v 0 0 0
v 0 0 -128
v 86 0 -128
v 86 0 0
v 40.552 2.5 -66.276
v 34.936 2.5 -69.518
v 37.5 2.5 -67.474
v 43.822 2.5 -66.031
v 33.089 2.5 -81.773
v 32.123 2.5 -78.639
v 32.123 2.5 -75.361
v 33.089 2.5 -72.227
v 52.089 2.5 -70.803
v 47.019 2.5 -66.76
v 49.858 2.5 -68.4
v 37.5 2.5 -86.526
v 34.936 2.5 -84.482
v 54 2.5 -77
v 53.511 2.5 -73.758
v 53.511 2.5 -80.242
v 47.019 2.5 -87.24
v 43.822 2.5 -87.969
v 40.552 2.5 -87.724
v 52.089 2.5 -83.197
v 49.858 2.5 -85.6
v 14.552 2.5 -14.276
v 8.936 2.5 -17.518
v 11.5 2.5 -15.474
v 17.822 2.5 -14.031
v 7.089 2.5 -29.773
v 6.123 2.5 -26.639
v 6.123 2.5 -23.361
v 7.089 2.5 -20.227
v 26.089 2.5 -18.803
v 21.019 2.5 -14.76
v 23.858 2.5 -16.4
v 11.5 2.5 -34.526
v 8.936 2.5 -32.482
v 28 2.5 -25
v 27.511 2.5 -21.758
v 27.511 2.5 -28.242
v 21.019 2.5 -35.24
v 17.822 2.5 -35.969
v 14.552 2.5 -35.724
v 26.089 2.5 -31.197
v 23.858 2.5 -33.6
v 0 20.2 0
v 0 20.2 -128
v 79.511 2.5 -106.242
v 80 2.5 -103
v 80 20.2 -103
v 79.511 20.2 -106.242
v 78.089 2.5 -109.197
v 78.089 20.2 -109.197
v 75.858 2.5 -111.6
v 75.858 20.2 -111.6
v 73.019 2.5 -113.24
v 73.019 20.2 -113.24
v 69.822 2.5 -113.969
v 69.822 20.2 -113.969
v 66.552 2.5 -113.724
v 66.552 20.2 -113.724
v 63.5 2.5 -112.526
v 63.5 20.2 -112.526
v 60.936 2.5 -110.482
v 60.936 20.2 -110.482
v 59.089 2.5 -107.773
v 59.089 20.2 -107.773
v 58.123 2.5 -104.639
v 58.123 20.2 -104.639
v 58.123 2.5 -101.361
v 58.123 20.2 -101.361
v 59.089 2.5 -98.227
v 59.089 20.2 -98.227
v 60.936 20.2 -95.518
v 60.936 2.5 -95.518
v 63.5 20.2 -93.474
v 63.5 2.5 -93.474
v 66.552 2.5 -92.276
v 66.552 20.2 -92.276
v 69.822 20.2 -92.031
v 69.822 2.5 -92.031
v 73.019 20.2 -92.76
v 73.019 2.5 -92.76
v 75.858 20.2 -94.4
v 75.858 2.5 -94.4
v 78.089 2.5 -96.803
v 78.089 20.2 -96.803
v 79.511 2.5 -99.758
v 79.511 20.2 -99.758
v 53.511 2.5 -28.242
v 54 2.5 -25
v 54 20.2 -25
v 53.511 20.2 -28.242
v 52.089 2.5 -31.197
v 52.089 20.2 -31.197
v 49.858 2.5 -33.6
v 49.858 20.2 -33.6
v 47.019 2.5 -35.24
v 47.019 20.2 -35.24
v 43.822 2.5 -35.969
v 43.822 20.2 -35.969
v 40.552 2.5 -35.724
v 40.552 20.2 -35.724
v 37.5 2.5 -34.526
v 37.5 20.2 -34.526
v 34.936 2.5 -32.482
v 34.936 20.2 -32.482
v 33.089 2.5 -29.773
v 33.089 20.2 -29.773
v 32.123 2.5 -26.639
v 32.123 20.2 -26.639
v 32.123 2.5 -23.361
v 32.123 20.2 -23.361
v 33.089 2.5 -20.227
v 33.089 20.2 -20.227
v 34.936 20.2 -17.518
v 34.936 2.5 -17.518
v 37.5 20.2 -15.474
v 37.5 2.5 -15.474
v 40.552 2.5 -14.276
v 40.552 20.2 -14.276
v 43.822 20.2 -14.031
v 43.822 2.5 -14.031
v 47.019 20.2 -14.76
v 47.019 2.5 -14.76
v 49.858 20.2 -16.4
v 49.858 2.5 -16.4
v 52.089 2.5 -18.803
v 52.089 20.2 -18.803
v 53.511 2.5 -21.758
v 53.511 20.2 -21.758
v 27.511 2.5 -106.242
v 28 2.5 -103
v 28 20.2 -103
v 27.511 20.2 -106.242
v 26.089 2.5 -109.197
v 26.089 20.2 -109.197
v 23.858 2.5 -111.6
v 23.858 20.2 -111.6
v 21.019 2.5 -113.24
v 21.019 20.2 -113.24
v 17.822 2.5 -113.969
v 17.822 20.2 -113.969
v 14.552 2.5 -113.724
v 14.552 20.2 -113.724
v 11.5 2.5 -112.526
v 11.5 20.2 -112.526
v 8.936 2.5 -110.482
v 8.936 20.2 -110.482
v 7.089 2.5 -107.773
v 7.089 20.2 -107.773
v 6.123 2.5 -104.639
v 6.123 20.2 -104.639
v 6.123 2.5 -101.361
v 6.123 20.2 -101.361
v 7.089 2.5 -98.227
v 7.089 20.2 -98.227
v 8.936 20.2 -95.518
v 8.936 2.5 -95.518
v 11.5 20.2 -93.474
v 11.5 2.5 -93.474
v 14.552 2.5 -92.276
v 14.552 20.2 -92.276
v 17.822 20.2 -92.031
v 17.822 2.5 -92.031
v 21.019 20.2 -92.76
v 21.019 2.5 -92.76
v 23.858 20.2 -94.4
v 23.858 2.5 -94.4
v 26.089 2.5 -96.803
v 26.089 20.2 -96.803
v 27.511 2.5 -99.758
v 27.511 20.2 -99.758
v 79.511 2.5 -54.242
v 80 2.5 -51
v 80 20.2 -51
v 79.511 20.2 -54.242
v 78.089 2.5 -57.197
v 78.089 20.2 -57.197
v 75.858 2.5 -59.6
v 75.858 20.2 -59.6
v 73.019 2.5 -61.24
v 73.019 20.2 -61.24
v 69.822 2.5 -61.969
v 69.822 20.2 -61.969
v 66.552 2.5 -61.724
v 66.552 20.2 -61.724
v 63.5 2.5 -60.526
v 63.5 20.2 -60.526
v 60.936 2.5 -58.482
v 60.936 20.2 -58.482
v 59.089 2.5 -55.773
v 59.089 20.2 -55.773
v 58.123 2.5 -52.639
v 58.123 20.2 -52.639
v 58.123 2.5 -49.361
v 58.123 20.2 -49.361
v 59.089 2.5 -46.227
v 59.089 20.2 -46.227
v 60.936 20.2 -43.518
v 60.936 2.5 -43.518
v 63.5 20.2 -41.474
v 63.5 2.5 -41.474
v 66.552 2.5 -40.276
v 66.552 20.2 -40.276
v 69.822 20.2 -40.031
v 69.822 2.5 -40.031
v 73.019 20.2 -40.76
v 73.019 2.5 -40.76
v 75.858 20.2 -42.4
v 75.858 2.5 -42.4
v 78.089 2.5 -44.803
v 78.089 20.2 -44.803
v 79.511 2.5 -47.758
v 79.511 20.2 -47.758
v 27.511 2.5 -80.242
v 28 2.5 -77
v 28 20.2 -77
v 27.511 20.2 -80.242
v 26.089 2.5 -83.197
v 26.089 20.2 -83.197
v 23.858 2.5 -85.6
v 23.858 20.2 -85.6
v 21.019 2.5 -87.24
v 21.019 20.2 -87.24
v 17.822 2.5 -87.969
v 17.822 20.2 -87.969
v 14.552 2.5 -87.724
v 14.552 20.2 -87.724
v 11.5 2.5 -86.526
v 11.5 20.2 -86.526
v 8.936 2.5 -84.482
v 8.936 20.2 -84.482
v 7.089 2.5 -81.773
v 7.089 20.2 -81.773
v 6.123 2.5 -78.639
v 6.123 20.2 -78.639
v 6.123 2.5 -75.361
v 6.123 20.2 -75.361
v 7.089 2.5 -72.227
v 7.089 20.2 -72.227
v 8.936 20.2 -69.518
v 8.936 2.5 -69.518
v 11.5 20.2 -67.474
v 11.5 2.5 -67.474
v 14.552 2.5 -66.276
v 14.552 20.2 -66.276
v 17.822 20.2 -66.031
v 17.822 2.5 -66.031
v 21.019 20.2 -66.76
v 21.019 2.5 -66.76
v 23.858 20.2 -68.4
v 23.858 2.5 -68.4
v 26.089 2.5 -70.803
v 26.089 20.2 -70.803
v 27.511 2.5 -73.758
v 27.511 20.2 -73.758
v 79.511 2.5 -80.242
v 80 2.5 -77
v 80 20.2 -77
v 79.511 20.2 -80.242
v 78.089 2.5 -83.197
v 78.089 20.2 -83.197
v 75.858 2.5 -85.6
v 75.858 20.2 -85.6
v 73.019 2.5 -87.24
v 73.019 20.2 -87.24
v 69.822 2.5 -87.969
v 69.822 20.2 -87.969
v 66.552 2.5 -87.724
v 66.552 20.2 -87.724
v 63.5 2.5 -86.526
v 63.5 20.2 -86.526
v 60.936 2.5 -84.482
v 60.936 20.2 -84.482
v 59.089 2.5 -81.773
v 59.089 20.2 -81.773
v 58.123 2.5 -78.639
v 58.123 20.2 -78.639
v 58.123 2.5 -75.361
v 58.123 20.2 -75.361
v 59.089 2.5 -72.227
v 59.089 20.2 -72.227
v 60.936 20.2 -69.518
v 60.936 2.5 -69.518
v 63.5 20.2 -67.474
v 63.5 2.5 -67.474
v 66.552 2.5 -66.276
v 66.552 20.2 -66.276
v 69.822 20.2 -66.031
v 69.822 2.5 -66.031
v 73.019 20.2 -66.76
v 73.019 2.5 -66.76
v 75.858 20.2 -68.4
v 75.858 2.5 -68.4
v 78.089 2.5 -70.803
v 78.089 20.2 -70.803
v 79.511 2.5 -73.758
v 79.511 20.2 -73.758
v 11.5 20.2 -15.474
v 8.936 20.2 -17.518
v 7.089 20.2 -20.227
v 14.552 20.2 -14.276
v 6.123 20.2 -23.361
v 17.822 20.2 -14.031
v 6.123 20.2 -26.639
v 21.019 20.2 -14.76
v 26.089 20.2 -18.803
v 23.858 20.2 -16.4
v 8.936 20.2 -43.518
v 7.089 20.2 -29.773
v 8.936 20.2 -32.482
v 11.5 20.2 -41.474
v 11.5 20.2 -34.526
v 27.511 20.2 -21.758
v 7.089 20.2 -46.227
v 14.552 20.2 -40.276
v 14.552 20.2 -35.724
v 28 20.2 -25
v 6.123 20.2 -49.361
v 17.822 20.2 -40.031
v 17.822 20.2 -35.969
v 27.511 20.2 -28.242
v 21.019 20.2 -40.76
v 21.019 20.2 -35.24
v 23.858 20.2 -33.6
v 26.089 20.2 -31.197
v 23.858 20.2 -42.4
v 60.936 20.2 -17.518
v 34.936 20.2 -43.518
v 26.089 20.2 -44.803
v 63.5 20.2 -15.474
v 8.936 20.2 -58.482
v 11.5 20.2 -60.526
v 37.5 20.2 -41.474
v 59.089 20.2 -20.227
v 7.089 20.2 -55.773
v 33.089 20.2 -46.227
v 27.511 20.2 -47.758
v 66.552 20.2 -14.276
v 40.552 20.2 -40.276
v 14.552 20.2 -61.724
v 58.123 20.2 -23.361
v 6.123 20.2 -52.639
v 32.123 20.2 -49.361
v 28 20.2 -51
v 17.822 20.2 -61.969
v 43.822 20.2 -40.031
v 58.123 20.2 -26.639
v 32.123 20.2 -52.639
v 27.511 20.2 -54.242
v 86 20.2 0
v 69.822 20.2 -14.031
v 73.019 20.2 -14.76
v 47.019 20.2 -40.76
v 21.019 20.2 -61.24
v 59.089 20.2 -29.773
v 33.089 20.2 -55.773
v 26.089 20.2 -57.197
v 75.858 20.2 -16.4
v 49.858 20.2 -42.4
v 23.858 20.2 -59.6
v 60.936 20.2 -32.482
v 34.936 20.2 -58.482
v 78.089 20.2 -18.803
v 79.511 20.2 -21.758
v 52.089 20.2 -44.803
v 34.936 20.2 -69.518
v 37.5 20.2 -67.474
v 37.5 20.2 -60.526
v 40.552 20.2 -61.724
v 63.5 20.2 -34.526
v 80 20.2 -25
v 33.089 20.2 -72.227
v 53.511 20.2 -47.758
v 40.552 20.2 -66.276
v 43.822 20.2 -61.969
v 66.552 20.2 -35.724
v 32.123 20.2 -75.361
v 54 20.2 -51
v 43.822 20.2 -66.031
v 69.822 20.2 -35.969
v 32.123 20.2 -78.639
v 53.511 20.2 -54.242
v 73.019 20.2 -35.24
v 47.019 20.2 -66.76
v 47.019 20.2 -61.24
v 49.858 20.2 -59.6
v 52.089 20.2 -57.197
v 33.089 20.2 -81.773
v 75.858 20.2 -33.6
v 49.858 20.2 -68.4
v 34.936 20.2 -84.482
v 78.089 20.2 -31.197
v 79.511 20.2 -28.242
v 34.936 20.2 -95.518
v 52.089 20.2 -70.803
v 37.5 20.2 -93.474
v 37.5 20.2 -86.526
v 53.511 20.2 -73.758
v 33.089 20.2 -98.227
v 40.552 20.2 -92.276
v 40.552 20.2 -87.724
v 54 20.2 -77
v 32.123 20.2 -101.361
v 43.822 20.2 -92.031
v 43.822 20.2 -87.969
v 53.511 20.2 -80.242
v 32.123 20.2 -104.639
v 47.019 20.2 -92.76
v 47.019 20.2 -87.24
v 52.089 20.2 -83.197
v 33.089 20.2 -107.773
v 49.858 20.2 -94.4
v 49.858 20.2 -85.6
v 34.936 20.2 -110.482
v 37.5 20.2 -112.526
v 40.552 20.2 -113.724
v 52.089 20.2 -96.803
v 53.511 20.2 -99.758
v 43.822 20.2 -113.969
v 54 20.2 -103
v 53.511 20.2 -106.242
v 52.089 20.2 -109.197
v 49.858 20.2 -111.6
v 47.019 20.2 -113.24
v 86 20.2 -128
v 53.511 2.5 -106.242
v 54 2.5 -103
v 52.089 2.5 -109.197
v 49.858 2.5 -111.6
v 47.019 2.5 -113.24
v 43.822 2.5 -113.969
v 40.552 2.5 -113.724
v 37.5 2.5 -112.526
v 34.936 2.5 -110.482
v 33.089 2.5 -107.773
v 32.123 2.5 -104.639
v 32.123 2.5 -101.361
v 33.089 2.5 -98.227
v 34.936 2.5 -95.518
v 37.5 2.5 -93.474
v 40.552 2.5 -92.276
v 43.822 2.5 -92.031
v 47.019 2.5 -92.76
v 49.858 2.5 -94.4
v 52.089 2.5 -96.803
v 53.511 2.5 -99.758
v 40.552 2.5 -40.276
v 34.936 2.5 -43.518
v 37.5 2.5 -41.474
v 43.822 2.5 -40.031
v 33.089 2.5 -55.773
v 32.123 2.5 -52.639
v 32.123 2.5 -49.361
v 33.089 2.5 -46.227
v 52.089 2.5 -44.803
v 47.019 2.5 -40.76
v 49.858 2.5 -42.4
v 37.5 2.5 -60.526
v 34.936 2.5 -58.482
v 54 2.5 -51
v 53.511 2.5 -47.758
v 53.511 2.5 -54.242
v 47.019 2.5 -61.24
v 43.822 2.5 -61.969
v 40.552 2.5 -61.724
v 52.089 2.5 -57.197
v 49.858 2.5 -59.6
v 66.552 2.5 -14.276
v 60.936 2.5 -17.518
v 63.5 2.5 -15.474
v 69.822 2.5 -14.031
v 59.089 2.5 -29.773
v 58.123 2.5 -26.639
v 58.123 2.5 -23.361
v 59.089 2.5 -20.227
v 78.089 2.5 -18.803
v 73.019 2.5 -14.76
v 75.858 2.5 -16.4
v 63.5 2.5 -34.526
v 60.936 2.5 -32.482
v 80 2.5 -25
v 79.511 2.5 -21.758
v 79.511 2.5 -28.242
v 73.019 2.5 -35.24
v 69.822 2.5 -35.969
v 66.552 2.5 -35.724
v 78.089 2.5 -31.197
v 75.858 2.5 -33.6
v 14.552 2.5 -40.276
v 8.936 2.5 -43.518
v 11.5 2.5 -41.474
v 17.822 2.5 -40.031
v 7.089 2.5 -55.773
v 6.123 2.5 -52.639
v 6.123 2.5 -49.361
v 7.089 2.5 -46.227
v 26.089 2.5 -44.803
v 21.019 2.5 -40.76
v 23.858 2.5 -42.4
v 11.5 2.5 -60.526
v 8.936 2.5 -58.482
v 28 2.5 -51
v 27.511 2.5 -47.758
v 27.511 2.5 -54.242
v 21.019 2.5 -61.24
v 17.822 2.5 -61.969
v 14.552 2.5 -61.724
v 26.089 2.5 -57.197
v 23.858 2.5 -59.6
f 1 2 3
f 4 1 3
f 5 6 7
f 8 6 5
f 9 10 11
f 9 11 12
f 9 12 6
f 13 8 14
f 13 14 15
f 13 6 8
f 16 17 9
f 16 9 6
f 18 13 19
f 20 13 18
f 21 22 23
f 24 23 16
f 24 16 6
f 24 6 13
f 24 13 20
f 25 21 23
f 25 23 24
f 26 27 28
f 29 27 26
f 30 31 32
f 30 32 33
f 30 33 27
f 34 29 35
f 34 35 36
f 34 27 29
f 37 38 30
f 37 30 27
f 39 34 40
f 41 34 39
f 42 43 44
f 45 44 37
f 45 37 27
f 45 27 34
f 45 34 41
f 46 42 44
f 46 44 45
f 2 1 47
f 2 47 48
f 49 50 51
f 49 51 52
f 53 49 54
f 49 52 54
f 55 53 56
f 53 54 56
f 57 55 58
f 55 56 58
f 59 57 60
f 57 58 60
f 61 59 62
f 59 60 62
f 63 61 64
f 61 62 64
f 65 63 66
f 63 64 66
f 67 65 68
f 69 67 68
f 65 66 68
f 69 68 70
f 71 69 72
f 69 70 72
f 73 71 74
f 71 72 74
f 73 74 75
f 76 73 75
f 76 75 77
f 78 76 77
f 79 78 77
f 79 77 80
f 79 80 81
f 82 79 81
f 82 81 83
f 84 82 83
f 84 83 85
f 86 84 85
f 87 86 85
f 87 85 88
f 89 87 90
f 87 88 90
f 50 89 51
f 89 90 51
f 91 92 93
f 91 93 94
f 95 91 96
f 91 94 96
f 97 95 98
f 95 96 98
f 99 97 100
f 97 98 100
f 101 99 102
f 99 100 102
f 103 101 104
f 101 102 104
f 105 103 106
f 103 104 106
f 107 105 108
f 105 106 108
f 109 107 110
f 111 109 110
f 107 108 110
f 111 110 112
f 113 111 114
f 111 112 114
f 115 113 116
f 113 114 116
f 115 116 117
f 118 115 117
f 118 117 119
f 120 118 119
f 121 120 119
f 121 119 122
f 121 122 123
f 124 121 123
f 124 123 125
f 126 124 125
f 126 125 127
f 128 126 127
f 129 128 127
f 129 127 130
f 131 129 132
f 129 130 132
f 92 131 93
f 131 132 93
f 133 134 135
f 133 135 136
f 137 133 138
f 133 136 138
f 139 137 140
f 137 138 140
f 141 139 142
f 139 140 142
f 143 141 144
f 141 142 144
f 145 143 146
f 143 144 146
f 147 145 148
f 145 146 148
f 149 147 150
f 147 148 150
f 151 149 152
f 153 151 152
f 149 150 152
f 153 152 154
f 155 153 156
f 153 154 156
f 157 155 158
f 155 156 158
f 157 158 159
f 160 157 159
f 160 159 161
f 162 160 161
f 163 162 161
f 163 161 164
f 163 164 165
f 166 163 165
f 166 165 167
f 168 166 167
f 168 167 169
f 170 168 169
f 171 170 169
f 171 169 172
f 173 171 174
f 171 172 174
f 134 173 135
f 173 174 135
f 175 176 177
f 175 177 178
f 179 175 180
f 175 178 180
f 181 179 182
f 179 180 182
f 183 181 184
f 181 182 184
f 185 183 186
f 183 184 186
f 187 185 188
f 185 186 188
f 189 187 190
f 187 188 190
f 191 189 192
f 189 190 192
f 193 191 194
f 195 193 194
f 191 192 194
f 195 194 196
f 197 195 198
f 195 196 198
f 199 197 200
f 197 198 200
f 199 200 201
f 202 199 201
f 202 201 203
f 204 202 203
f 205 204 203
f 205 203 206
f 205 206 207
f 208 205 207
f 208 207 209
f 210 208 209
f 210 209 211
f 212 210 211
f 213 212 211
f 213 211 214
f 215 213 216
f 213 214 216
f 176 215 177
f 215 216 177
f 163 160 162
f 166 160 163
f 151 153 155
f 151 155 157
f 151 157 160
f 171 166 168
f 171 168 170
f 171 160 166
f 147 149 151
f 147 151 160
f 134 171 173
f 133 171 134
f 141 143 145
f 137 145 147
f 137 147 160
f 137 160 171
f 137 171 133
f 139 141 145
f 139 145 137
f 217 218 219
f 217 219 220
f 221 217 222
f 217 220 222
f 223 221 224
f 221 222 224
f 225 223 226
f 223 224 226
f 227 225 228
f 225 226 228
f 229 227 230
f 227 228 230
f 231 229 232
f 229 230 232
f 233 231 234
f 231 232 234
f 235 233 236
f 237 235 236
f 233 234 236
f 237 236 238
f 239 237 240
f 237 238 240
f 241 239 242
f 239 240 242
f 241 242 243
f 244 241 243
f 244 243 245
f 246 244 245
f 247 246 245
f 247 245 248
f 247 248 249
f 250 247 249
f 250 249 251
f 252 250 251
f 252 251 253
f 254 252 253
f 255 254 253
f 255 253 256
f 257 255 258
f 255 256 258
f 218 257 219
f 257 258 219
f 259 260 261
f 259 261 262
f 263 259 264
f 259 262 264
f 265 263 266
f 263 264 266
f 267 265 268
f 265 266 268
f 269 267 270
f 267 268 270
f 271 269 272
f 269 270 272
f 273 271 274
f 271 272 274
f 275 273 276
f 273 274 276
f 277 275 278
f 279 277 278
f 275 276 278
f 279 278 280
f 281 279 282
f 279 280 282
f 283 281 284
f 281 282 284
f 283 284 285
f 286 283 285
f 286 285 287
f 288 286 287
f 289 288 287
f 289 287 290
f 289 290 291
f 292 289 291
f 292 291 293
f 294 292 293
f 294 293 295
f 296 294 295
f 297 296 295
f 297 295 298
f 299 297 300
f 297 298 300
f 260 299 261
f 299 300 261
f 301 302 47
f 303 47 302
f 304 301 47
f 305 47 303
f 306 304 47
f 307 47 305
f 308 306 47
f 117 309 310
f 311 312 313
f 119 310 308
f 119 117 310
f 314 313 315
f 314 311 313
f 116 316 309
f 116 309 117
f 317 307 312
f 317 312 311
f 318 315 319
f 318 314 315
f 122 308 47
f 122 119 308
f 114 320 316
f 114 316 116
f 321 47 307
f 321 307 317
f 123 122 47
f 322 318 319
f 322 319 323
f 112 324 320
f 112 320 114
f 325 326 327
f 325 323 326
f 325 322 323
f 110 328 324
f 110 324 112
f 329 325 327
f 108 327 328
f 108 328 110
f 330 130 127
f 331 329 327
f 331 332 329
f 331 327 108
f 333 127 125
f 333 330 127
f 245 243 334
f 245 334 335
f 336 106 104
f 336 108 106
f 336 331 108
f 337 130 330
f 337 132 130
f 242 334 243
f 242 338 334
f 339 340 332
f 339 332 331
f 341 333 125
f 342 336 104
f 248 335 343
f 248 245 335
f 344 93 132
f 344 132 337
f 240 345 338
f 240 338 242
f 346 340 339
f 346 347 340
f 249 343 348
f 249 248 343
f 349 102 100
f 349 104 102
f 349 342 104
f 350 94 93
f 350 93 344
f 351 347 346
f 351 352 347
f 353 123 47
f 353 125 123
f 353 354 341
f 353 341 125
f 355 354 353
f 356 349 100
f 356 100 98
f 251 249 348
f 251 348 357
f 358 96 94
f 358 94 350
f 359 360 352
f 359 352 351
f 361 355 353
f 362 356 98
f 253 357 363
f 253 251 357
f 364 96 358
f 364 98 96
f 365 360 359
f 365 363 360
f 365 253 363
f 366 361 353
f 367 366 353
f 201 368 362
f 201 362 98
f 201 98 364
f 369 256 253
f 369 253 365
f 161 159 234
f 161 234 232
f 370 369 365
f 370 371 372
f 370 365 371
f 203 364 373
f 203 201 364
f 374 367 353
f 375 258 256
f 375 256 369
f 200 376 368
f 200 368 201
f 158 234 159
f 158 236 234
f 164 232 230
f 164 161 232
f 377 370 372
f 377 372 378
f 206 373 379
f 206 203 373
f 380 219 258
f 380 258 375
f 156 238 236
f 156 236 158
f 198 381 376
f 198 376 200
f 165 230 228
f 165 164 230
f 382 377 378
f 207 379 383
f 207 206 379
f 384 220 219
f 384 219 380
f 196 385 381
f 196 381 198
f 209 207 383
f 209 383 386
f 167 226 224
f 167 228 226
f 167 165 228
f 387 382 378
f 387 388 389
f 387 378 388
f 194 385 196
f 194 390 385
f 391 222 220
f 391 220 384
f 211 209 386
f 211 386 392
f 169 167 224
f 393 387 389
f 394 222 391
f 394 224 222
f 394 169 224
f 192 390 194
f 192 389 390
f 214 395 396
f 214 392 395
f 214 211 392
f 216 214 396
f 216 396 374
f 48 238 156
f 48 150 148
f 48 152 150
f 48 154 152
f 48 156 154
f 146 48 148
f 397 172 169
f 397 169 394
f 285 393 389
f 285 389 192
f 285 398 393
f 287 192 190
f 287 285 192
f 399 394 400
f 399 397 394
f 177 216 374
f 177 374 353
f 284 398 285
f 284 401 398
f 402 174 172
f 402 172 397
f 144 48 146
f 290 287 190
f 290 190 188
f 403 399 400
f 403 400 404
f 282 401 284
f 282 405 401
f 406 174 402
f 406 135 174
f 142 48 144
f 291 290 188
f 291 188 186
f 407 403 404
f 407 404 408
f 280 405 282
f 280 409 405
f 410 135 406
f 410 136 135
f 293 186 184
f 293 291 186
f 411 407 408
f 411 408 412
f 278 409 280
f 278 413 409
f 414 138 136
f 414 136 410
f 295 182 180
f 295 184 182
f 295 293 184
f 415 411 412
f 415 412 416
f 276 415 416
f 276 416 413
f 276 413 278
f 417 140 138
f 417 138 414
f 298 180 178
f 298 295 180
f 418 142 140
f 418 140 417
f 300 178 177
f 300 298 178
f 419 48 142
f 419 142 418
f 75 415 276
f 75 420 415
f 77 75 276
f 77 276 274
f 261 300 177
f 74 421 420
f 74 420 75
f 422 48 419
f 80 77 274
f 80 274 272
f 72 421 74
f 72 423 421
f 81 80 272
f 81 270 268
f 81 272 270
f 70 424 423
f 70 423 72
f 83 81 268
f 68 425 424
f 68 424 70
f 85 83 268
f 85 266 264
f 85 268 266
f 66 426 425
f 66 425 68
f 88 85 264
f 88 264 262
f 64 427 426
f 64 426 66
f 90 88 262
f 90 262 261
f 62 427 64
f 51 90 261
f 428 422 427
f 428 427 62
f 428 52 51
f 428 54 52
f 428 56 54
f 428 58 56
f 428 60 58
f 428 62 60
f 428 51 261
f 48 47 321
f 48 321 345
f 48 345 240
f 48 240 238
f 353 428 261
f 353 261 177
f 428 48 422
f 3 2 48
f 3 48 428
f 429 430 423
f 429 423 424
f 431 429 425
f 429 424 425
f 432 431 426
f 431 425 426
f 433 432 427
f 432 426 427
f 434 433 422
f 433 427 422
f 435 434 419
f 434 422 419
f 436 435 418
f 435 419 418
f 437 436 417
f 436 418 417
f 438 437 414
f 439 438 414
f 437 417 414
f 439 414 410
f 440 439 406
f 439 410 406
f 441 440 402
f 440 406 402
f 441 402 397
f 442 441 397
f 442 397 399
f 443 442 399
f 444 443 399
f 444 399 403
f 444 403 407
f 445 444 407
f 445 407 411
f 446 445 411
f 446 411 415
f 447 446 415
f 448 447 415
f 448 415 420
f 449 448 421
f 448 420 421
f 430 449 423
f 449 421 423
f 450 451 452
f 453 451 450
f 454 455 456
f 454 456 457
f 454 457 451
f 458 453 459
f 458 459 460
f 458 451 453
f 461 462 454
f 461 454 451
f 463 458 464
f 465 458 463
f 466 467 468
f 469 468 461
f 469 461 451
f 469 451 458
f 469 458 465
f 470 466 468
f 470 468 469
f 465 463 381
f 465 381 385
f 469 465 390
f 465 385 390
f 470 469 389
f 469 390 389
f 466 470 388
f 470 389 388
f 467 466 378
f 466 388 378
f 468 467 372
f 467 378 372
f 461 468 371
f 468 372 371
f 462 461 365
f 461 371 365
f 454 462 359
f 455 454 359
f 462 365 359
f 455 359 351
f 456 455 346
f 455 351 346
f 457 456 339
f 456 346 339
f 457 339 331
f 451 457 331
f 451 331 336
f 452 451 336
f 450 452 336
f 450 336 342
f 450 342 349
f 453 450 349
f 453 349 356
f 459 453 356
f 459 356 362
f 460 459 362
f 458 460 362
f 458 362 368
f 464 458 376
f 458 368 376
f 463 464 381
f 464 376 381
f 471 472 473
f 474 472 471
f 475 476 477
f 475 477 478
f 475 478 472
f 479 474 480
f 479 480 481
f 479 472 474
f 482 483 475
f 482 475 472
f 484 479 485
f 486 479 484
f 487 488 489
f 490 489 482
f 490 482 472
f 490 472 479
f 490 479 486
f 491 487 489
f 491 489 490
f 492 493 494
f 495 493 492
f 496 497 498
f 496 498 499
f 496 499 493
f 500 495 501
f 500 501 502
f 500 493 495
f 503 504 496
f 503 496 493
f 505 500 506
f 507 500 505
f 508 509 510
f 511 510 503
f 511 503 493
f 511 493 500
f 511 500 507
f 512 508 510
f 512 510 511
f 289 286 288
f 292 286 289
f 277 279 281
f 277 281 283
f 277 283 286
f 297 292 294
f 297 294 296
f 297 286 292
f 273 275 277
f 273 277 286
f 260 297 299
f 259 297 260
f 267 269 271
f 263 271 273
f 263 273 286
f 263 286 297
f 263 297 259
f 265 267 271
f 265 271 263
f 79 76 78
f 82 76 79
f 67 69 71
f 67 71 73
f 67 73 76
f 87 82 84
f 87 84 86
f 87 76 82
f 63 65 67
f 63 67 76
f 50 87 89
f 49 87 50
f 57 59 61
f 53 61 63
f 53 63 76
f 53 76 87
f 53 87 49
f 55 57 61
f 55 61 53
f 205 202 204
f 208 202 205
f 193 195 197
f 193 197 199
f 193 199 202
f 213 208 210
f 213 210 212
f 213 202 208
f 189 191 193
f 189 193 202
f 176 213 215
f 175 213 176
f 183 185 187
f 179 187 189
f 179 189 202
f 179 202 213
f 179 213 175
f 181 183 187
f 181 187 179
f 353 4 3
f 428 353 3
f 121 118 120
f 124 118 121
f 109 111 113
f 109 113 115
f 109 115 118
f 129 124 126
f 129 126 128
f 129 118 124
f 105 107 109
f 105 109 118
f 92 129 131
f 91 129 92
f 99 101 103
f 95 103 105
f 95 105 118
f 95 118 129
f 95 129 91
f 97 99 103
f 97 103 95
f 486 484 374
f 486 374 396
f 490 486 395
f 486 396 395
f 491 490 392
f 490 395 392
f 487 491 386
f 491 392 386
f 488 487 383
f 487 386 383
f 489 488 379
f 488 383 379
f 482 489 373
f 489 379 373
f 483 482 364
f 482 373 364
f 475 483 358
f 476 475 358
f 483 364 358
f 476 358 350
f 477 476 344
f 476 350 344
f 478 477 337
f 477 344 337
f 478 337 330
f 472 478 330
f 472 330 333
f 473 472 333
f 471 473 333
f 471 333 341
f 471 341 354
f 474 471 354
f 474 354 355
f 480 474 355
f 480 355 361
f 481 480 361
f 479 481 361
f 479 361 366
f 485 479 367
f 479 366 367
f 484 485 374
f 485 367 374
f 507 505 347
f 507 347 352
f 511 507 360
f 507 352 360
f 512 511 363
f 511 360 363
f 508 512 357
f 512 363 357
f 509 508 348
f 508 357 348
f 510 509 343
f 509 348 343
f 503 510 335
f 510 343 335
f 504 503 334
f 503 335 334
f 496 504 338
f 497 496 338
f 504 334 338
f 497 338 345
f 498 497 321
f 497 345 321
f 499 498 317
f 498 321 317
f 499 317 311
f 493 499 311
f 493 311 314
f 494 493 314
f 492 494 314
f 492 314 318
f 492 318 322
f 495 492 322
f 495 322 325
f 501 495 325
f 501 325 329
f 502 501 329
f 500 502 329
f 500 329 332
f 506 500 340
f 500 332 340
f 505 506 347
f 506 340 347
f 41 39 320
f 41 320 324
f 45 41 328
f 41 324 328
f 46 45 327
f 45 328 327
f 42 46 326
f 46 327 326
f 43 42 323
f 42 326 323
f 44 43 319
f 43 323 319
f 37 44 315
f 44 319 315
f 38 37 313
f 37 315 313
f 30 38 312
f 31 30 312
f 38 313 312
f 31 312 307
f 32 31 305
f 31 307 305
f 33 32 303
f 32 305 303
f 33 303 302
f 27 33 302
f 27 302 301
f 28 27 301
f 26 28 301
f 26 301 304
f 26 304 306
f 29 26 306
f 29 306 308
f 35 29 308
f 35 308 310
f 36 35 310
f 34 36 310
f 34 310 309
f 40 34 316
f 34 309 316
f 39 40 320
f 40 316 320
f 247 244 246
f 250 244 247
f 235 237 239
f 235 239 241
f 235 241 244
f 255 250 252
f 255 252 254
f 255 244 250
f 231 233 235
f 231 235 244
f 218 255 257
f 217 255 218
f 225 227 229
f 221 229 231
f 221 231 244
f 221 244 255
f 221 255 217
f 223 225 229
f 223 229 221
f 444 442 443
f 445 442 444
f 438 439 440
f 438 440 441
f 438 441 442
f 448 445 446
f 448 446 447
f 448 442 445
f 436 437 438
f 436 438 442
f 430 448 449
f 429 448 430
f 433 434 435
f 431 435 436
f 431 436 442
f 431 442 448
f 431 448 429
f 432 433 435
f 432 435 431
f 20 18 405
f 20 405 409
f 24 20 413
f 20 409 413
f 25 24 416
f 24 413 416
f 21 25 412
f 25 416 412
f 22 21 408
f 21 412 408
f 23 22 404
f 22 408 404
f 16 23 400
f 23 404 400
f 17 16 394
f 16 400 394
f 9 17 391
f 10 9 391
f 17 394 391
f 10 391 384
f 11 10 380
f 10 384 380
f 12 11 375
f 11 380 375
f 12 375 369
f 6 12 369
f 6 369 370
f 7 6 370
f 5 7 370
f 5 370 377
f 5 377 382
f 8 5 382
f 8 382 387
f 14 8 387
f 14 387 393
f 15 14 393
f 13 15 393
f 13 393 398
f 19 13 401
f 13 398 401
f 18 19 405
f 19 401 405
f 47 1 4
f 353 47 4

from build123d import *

# Parameters (mm, degrees)
SKETCH1_W            = 86
SKETCH1_H            = 128
BOSS_EXTRUDE1_DEPTH  = 20.2
SKETCH2_R            = 11
CUT_EXTRUDE1_DEPTH   = 17.7
LPATTERN3_COUNT      = 4
LPATTERN3_PITCH      = 26
LPATTERN3_COUNT_DIR2 = 3
LPATTERN3_PITCH_DIR2 = 26


with BuildPart() as part:
    # Sketch1 → Boss-Extrude1 (new body)
    with BuildSketch(Plane(origin=(0, 0, 0), x_dir=(1, 0, 0), z_dir=(0, 1, 0))):
        with Locations((43, 64)):
            Rectangle(SKETCH1_W, SKETCH1_H)
    extrude(amount=BOSS_EXTRUDE1_DEPTH)

    # Sketch2 → Cut-Extrude1 (cut)
    with BuildSketch(Plane(origin=(0, 20.2, 0), x_dir=(1, 0, 0), z_dir=(0, 1, 0))):
        with Locations((17, 25)):
            Circle(SKETCH2_R)
    cut_extrude1 = extrude(amount=-CUT_EXTRUDE1_DEPTH, mode=Mode.SUBTRACT)

    # LPattern3: Cut-Extrude1 4 × 3
    with Locations(*[(j * LPATTERN3_PITCH_DIR2, 0, -i * LPATTERN3_PITCH) for i in range(LPATTERN3_COUNT) for j in range(LPATTERN3_COUNT_DIR2) if (i, j) != (0, 0)]):
        add(cut_extrude1, mode=Mode.SUBTRACT)


solid = part.part
